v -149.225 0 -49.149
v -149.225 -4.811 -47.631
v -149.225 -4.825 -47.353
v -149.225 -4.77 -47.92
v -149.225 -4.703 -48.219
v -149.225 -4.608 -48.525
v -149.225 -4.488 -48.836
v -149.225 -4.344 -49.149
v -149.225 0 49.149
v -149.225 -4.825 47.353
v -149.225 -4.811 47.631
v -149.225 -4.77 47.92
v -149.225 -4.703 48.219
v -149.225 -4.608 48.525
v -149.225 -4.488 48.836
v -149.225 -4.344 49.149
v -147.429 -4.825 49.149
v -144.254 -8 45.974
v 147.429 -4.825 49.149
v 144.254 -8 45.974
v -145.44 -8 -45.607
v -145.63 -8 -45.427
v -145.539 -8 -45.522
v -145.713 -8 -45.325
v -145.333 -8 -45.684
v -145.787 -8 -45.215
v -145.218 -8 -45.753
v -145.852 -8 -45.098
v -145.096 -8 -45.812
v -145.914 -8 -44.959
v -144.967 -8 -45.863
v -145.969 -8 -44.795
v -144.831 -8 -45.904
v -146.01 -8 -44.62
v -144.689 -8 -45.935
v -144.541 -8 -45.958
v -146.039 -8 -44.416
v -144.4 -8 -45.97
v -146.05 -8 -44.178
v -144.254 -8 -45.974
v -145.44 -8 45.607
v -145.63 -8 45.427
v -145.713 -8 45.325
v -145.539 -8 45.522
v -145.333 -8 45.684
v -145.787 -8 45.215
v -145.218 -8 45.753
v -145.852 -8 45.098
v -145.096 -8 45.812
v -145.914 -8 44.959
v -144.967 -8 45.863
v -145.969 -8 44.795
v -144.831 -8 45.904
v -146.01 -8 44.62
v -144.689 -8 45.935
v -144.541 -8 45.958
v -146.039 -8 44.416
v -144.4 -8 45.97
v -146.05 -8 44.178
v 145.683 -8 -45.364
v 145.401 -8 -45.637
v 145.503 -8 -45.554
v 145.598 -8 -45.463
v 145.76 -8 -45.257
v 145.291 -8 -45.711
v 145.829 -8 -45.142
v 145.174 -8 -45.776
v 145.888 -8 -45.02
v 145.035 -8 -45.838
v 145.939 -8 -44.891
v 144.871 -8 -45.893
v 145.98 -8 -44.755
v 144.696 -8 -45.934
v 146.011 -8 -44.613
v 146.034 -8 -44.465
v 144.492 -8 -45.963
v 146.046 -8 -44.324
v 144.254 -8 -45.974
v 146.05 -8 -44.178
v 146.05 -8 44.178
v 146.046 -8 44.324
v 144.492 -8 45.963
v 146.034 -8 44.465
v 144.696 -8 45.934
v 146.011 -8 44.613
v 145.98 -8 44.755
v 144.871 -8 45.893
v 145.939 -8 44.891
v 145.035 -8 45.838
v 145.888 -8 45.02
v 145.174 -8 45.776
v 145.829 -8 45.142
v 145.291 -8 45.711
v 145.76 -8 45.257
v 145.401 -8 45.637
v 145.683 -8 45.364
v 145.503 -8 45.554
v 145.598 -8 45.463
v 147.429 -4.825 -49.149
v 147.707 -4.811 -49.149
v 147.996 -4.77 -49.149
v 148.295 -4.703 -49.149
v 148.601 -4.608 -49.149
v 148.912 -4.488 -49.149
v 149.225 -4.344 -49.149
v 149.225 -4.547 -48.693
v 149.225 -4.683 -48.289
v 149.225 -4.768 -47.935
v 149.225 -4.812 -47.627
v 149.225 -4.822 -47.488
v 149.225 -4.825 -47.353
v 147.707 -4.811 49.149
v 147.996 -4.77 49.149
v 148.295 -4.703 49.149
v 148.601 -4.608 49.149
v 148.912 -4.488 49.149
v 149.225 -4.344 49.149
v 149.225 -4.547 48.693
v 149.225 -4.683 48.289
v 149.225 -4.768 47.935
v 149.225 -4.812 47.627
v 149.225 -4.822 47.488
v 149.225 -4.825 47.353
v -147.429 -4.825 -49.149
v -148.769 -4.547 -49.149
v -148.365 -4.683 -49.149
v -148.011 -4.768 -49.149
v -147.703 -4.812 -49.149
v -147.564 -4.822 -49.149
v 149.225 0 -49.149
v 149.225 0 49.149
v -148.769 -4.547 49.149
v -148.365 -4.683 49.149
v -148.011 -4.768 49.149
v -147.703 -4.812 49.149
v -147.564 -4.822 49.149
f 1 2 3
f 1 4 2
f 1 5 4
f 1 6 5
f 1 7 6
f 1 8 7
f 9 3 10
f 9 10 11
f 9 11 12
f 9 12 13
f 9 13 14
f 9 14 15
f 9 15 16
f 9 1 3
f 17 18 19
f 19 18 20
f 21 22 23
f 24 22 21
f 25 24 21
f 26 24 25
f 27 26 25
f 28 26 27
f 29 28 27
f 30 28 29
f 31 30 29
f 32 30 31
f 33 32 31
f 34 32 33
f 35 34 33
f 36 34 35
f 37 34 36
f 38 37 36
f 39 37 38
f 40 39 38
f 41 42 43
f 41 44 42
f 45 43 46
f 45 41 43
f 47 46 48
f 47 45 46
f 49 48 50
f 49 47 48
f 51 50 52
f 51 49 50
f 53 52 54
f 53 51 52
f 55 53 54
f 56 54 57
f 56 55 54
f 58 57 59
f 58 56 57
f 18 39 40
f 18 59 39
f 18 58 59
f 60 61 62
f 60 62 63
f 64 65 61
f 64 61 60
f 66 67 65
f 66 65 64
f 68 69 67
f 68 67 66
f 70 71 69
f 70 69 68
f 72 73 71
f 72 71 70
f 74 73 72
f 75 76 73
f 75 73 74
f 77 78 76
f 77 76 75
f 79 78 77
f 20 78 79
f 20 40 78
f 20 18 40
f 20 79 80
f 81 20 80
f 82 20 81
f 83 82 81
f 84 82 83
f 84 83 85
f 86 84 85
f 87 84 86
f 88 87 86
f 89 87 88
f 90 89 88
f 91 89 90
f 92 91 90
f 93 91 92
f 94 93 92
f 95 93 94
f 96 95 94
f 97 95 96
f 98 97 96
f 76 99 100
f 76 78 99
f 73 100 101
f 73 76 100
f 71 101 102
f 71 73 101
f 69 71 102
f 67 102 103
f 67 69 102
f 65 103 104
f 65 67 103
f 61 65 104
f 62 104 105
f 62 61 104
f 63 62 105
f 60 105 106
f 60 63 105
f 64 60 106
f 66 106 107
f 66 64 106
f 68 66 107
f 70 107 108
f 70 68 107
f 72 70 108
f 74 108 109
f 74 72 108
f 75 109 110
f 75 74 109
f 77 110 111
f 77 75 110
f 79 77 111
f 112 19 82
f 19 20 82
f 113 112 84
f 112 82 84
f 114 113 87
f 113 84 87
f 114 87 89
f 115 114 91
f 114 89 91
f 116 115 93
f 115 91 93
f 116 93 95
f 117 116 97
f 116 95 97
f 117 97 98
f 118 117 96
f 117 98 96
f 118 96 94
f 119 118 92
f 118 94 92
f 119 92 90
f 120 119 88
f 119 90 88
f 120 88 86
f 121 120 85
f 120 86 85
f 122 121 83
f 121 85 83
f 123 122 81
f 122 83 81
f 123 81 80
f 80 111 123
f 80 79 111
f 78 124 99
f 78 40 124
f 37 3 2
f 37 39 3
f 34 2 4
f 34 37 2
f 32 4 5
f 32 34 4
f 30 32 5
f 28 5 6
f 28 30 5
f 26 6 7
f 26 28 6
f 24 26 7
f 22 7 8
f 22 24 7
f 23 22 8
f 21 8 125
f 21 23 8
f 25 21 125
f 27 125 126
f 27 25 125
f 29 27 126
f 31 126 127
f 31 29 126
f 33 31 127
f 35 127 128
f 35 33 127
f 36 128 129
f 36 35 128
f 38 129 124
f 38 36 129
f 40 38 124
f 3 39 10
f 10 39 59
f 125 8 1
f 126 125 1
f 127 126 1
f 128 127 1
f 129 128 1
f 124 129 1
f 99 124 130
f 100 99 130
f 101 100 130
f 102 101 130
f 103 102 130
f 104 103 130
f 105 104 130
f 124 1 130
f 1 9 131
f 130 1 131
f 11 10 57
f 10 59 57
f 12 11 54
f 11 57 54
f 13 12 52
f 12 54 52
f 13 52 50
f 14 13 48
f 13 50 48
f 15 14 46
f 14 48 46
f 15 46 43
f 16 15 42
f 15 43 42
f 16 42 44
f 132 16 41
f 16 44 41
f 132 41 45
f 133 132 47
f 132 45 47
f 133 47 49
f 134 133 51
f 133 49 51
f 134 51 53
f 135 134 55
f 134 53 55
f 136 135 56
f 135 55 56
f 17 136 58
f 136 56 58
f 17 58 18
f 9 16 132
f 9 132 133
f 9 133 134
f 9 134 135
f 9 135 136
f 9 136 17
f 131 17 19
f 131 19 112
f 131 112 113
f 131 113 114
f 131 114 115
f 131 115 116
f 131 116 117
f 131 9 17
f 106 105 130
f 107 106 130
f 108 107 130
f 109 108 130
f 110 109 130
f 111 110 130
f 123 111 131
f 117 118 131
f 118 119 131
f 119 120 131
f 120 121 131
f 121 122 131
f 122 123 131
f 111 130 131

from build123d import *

# Parameters (mm, degrees)
F0_W     = 298.45
F0_H     = 98.298
F1_DEPTH = 8
F2_SIZE  = 3.175
F3_R     = 2.54


with BuildPart() as f1:
    # F0 (on Front) → F1 (new body)
    with BuildSketch(Plane.XZ):
        Rectangle(F0_W, F0_H)
    extrude(amount=F1_DEPTH)

    # F2
    f2_edges = [f1.edges().sort_by_distance(p)[0] for p in [
        (0, -8, 49.149),
        (-149.225, -8, 0),
        (0, -8, -49.149),
        (149.225, -8, 0),
    ]]
    chamfer(f2_edges, length=F2_SIZE)

    # F3
    f3_edges = [f1.edges().sort_by_distance(p)[0] for p in [
        (147.6375, -6.4125, 47.5615),
        (147.6375, -6.4125, -47.5615),
        (-147.6375, -6.4125, -47.5615),
        (-147.6375, -6.4125, 47.5615),
    ]]
    fillet(f3_edges, radius=F3_R)


solid = f1.part
